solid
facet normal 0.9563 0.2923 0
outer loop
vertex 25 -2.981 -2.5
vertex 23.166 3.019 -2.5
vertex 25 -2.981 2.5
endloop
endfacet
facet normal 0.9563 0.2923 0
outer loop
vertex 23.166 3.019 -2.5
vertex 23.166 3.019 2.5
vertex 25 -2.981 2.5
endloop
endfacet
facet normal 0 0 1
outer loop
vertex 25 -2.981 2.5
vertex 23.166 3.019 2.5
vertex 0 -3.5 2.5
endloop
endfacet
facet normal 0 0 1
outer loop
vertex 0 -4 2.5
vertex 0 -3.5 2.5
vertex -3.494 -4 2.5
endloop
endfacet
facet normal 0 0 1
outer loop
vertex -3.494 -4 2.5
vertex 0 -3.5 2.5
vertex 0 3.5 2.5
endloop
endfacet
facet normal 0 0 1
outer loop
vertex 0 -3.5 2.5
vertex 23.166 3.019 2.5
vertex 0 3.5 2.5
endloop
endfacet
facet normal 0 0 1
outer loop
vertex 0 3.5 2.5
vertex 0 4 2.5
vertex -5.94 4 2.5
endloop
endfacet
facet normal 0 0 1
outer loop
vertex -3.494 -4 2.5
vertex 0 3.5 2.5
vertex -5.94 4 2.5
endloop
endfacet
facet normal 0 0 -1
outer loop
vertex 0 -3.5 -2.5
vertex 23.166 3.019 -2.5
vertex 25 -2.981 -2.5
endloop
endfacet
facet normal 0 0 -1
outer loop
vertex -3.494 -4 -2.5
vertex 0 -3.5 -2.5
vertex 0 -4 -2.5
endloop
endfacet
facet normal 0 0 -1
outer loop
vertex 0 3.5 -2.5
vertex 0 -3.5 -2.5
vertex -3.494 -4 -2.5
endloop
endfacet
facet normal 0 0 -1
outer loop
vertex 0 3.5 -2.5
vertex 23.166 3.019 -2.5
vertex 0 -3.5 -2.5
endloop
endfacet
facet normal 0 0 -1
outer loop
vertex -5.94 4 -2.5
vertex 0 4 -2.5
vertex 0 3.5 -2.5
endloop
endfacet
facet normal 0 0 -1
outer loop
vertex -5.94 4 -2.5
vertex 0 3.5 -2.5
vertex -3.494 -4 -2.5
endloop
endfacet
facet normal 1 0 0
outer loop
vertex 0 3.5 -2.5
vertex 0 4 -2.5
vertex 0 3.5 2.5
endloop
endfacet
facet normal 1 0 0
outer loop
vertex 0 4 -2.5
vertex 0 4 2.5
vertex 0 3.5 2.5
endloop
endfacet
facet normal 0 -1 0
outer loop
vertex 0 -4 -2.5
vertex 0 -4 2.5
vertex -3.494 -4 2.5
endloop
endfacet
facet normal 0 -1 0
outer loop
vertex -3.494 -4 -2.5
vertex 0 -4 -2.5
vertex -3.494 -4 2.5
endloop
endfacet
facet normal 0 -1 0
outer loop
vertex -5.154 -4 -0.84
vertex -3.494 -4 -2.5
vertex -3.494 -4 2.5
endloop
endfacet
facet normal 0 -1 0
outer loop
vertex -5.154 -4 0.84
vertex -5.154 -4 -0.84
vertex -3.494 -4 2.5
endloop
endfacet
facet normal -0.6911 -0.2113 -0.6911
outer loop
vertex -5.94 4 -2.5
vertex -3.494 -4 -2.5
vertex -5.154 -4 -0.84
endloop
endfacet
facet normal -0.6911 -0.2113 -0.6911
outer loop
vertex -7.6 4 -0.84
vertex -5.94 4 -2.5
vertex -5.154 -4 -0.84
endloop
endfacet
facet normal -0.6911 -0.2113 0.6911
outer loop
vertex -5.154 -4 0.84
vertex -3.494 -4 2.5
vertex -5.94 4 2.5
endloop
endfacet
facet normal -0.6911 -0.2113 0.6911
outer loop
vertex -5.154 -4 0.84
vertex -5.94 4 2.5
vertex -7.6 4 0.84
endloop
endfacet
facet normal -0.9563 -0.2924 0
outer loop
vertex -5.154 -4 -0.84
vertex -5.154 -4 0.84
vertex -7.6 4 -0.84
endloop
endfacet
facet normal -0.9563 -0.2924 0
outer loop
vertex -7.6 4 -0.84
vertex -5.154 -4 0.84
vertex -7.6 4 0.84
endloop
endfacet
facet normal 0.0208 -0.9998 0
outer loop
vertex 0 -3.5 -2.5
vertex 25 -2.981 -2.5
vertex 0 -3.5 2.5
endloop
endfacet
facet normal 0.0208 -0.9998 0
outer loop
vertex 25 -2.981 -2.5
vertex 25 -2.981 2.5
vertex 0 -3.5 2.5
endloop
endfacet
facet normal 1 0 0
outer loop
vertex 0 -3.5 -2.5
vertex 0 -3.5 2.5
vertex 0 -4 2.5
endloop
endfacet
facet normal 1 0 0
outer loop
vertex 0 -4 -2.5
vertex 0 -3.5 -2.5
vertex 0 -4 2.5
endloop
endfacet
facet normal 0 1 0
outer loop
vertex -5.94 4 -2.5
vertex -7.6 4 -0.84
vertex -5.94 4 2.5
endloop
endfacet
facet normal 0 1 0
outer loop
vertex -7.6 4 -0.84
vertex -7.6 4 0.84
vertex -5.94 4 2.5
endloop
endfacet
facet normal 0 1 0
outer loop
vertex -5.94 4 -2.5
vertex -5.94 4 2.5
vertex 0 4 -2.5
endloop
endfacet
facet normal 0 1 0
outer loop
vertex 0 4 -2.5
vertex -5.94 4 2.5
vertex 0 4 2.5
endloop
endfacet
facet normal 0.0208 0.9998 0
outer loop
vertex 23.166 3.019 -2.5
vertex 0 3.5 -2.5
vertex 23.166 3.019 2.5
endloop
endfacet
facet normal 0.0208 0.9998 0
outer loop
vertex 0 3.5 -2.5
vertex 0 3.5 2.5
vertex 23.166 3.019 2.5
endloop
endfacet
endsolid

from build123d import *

# Parameters (mm, degrees)
BASE_EXTRUDE_DEPTH    = 2.5
CORTE_EXTRUS_O1_DEPTH = 10


with BuildPart() as part:
    # Sketch1 → Base-Extrude (new, symmetric)
    with BuildSketch(Plane.XY):
        Polygon((-5.154154548, -4), (-7.6, 4), (0, 4), (0, 3.5), (23.165615911, 3.019042465), (25, -2.980957535), (0, -3.5), (0, -4), align=None)
    extrude(amount=BASE_EXTRUDE_DEPTH, both=True)

    # Esboço1 → Corte-extrusão1 (cut, along a direction that is not the sketch's normal)
    with BuildSketch(Plane(origin=(0, 4, 0), x_dir=(1, 0, 0), z_dir=(0, 1, 0))):
        Polygon((-5.94, -2.5), (-7.6, -0.84), (-7.6, -2.5), align=None)
        Polygon((-5.94, 2.5), (-7.6, 0.84), (-7.6, 2.5), align=None)
    extrude(amount=-CORTE_EXTRUS_O1_DEPTH, dir=(-0.29237170472273044, 0.9563047559630375, 0), mode=Mode.SUBTRACT)


solid = part.part
